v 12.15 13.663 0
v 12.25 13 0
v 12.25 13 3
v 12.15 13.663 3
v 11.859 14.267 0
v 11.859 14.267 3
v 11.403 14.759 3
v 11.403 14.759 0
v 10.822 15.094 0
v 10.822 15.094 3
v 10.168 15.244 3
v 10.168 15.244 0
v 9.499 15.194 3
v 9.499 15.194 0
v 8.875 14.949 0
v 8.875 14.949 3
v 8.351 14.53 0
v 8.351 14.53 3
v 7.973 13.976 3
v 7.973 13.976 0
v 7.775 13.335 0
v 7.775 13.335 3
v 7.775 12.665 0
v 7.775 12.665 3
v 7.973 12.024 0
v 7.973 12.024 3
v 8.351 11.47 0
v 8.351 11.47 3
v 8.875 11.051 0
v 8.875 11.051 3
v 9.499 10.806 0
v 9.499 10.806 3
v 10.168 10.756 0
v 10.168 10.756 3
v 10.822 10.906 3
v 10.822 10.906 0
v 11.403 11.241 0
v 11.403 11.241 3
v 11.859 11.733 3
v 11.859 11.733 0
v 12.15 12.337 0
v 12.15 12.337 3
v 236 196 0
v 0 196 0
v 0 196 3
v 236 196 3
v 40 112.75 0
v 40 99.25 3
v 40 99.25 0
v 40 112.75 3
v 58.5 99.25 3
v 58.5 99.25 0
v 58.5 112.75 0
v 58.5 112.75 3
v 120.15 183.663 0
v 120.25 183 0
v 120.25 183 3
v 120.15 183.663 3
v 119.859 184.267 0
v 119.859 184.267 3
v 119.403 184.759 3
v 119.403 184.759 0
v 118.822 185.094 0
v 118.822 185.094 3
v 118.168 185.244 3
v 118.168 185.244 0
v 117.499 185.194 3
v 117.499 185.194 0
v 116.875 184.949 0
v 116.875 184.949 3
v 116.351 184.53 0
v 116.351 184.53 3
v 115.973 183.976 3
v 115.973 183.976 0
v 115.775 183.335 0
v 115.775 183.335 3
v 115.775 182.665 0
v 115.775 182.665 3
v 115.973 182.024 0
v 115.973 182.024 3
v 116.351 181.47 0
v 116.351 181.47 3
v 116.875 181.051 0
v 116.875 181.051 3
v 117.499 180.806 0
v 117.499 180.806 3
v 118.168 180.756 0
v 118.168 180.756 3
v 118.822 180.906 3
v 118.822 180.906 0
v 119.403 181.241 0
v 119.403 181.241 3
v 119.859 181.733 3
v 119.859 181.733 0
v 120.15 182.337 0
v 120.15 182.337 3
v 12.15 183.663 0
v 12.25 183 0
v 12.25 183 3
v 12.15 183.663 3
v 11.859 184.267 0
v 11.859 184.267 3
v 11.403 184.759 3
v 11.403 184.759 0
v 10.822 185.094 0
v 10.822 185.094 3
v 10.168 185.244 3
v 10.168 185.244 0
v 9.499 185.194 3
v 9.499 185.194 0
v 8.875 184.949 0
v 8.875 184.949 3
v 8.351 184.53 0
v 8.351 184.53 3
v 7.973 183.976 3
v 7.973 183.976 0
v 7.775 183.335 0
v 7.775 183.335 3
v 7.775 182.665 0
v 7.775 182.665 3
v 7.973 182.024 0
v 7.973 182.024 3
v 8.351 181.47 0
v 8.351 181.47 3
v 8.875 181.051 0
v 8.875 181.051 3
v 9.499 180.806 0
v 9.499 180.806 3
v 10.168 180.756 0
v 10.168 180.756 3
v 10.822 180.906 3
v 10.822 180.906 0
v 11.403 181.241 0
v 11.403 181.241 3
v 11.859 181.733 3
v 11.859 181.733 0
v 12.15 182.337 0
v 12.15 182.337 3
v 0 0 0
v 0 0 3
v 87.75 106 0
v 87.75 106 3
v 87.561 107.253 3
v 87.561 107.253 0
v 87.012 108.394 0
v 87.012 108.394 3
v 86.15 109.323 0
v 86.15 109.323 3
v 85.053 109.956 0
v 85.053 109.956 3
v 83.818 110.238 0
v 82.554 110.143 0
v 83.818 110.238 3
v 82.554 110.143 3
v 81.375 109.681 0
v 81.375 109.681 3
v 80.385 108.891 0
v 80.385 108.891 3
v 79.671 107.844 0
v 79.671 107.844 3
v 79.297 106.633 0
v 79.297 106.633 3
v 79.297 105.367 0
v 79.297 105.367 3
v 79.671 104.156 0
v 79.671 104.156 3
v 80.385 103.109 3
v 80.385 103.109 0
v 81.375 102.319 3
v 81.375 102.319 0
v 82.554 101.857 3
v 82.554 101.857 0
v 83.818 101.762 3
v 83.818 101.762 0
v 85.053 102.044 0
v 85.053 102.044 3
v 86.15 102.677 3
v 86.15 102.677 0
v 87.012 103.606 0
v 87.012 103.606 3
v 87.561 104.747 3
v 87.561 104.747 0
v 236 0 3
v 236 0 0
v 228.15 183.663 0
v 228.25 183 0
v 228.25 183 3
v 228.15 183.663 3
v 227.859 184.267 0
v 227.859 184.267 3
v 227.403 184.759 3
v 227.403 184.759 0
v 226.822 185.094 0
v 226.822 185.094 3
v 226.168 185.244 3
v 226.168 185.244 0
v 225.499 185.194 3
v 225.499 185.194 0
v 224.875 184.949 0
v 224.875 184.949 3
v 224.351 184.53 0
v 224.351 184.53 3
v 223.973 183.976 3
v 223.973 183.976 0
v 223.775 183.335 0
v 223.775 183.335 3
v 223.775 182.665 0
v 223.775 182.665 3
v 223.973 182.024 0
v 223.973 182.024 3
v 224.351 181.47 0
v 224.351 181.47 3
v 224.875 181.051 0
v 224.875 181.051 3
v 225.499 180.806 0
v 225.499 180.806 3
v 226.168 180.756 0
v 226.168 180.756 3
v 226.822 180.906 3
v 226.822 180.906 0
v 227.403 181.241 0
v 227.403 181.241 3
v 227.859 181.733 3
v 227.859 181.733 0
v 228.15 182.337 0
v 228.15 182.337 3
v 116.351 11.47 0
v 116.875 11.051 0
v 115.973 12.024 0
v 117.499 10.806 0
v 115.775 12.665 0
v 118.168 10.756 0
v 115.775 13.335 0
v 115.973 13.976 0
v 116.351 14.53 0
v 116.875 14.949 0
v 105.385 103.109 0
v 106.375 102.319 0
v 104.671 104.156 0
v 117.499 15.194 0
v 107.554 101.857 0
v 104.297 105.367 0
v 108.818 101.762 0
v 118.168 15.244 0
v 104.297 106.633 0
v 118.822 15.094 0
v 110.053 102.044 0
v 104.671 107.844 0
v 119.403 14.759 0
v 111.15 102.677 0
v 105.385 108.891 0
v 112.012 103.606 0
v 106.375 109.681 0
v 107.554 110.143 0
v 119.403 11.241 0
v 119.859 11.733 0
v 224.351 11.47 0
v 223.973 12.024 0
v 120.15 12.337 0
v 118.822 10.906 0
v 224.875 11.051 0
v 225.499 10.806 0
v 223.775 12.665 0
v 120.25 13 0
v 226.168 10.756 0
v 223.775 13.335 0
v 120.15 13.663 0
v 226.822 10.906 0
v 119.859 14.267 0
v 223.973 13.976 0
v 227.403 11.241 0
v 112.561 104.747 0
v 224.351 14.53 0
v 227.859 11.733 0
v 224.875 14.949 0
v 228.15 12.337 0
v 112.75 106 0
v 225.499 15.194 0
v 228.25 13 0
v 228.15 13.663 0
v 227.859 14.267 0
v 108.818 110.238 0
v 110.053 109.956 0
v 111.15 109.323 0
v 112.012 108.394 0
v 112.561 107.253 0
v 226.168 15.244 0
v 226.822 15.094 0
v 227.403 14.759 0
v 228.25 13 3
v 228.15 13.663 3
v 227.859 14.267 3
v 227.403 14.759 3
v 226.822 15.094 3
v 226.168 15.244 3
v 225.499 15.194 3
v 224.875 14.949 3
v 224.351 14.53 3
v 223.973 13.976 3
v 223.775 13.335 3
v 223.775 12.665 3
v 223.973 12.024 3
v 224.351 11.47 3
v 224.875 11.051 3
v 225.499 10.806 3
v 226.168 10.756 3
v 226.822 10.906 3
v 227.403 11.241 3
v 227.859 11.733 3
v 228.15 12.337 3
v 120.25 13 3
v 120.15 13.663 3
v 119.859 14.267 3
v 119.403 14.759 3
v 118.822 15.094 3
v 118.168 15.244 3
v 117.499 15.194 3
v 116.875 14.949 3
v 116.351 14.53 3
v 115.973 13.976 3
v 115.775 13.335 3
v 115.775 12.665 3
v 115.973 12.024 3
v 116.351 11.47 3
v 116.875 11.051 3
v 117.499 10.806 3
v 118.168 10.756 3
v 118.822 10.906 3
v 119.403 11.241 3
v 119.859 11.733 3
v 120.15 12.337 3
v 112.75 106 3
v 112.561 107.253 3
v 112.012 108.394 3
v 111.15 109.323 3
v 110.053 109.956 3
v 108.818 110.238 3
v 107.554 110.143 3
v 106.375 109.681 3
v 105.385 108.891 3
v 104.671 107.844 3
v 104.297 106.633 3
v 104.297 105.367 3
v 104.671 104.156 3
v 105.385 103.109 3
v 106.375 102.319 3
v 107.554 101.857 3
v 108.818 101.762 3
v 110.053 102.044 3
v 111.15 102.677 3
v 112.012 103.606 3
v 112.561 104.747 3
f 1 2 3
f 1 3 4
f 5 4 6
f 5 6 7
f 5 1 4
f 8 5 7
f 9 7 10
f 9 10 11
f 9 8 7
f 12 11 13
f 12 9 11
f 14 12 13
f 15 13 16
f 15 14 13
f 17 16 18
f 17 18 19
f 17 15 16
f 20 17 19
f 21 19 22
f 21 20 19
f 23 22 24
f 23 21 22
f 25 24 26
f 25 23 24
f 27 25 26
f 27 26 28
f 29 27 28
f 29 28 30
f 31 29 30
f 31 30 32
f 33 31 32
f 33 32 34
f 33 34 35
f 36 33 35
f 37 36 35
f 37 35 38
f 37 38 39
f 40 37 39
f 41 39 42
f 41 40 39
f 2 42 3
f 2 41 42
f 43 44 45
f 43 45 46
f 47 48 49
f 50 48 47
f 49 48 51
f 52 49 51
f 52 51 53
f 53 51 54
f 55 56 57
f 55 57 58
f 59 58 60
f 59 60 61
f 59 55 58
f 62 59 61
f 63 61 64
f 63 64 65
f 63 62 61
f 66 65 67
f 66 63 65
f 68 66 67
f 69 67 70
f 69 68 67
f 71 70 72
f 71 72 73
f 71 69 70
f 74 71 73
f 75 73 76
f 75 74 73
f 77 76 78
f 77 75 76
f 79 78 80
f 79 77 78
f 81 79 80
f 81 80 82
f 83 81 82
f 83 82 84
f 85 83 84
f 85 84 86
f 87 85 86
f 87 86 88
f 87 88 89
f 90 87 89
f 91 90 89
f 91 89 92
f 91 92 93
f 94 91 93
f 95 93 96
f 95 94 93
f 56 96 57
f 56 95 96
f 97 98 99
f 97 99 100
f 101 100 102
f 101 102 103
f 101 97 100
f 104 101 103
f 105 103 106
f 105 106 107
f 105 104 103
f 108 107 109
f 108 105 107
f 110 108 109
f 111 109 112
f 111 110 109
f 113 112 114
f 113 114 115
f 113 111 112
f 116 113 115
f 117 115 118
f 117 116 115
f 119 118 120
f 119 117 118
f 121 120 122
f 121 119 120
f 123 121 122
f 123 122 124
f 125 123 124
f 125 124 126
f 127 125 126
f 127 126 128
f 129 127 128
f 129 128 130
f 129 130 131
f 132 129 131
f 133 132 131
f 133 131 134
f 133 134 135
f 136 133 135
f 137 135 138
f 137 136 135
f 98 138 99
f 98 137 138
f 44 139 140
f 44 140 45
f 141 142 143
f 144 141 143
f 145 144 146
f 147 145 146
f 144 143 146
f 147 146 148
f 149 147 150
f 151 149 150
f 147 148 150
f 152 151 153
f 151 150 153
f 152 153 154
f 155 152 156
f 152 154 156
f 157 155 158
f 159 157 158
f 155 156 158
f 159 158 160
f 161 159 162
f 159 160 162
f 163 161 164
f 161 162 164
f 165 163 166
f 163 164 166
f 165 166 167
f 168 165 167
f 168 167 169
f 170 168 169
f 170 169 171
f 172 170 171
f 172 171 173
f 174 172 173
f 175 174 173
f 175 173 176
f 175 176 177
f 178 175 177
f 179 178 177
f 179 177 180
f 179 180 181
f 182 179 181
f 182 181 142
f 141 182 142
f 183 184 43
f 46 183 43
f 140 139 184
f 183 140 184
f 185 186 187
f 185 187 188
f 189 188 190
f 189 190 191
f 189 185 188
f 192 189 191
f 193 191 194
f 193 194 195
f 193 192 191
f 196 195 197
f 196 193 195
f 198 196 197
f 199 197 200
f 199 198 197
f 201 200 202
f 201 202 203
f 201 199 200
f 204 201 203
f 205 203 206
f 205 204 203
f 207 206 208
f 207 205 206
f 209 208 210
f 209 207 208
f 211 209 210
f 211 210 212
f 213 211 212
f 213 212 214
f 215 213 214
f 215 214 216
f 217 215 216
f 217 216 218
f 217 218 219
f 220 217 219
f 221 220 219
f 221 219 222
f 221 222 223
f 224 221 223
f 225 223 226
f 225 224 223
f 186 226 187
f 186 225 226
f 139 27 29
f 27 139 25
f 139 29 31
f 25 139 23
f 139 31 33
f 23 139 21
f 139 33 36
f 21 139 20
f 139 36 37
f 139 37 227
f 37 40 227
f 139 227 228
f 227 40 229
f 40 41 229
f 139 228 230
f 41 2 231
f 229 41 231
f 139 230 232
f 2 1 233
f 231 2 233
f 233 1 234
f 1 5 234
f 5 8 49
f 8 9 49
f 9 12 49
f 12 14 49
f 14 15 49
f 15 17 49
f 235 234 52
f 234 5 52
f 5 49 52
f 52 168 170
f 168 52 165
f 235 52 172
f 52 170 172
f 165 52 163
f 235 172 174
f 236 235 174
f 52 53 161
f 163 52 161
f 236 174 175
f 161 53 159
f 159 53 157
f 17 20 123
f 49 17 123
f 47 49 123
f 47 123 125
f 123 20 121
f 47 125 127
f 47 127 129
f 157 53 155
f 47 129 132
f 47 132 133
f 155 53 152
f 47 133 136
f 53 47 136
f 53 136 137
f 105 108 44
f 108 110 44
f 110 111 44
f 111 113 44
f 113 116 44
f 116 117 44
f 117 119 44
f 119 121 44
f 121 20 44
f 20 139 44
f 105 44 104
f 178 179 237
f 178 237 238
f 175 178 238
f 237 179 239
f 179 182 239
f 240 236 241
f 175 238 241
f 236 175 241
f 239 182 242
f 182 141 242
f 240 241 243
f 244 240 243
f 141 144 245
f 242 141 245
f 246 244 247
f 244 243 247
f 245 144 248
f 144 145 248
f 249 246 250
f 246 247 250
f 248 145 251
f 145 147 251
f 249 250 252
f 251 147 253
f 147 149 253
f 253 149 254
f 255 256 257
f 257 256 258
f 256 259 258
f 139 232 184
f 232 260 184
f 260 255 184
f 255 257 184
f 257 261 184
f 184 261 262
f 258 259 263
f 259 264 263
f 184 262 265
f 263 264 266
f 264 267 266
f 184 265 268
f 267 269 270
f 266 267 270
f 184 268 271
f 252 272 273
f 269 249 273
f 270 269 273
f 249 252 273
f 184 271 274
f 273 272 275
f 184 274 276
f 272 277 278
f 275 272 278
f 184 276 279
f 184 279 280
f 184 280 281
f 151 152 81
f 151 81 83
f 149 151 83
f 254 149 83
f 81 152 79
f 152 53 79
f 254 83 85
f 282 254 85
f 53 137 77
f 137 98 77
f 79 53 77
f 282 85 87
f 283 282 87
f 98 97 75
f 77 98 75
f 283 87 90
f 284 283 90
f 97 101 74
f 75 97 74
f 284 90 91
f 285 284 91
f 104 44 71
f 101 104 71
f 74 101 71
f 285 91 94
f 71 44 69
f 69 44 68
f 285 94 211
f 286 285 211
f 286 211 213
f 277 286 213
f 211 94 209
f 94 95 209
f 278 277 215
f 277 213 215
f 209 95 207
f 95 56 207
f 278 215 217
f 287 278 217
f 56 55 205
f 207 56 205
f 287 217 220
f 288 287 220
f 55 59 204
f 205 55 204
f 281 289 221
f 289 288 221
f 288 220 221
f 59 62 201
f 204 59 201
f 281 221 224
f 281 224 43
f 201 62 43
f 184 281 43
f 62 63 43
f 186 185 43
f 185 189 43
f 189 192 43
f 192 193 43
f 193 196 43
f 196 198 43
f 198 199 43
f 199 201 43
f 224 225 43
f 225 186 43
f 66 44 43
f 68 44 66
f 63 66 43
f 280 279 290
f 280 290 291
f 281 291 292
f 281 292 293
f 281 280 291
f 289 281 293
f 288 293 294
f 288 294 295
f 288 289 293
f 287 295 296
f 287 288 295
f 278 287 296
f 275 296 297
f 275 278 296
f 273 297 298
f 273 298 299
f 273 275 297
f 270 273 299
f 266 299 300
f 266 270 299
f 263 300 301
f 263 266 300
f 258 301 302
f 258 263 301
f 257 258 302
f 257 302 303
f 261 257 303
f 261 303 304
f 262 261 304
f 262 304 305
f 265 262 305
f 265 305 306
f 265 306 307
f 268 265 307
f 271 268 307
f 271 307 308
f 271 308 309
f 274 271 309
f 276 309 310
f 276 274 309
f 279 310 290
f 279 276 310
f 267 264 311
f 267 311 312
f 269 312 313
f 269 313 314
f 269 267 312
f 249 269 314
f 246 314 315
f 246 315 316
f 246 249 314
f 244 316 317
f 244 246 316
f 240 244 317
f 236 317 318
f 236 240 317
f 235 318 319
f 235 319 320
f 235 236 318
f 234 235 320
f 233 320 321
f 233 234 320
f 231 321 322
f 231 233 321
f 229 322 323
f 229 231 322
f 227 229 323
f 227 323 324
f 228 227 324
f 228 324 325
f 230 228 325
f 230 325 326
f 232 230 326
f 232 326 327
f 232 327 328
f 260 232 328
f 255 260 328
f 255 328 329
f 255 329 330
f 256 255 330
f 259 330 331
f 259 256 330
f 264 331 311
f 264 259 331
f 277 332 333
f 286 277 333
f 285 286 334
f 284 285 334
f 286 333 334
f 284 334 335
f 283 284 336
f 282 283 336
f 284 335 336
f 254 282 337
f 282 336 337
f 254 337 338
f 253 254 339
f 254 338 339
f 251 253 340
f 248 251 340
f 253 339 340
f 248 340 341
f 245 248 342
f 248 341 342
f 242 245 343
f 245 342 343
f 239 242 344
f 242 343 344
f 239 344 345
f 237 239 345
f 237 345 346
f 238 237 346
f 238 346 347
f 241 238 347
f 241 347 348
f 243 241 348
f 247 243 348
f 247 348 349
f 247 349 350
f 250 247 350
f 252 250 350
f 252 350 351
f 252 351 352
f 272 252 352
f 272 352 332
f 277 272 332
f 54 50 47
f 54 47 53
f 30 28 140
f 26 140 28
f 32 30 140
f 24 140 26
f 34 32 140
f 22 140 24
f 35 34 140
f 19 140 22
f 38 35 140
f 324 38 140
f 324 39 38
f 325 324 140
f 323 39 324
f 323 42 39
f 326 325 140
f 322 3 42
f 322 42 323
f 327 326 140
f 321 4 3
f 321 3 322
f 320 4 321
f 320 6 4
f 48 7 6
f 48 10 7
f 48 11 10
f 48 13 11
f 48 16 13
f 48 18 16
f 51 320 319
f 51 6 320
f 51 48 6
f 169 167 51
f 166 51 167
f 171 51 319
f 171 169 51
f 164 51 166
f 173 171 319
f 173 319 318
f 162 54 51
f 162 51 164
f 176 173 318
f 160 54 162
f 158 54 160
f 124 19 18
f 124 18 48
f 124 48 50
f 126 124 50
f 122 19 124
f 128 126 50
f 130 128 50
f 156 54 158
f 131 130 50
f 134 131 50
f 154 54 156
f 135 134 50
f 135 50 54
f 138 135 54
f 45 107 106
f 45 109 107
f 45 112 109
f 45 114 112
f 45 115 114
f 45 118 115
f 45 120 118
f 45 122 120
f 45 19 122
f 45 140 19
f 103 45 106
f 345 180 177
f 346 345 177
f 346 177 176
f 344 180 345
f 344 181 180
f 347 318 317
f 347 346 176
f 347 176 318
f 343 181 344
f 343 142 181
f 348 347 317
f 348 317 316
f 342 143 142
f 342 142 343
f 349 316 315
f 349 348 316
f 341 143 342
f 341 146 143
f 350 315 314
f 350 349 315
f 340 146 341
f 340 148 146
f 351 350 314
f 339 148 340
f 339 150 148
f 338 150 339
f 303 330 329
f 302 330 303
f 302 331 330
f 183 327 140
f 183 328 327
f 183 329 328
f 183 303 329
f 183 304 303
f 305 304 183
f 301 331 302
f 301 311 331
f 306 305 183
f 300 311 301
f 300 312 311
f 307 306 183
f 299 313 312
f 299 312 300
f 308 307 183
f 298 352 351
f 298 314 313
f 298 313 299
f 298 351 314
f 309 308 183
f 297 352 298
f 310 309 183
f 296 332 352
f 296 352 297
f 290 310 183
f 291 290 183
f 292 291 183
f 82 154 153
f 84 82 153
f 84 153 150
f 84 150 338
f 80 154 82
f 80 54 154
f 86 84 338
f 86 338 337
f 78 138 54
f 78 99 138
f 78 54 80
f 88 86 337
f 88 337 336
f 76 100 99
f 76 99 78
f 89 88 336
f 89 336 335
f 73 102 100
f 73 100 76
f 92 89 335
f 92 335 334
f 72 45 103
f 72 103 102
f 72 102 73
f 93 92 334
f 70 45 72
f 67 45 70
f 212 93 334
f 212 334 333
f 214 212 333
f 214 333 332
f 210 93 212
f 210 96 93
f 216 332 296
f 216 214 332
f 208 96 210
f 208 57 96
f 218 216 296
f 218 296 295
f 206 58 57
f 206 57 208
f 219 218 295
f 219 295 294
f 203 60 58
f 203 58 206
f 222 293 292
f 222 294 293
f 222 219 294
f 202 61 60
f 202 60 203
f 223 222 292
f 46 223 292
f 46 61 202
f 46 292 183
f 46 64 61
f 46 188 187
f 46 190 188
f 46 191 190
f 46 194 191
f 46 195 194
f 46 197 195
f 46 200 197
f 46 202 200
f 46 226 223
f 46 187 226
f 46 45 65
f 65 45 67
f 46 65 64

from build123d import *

# Parameters (mm, degrees)
SKETCH_1_W          = 236
SKETCH_1_H          = 196
SKETCH_1_R          = 2.25
EXTRUDE_1_DEPTH     = 3
SKETCH_2_R          = 4.25
SKETCH_2_W          = 18.5
SKETCH_2_H          = 13.5
CUT_EXTRUDE_1_DEPTH = 4


with BuildPart() as part:
    # Эскиз1 → Бобышка-Вытянуть1 (new body)
    with BuildSketch(Plane.XY):
        with Locations((118, 98)):
            Rectangle(SKETCH_1_W, SKETCH_1_H)
        with Locations((10, 183)):
            Circle(SKETCH_1_R, mode=Mode.SUBTRACT)
        with Locations((10, 13)):
            Circle(SKETCH_1_R, mode=Mode.SUBTRACT)
        with Locations((226, 183)):
            Circle(SKETCH_1_R, mode=Mode.SUBTRACT)
        with Locations((226, 13)):
            Circle(SKETCH_1_R, mode=Mode.SUBTRACT)
        with Locations((118, 183)):
            Circle(SKETCH_1_R, mode=Mode.SUBTRACT)
        with Locations((118, 13)):
            Circle(SKETCH_1_R, mode=Mode.SUBTRACT)
    extrude(amount=EXTRUDE_1_DEPTH)

    # Эскиз2 → Вырез-Вытянуть1 (cut, through all)
    with BuildSketch(Plane.XY.offset(3)):
        with Locations((108.5, 106)):
            Circle(SKETCH_2_R)
        with Locations((83.5, 106)):
            Circle(SKETCH_2_R)
        with Locations((49.25, 106)):
            Rectangle(SKETCH_2_W, SKETCH_2_H)
    extrude(amount=-CUT_EXTRUDE_1_DEPTH, mode=Mode.SUBTRACT)


solid = part.part
